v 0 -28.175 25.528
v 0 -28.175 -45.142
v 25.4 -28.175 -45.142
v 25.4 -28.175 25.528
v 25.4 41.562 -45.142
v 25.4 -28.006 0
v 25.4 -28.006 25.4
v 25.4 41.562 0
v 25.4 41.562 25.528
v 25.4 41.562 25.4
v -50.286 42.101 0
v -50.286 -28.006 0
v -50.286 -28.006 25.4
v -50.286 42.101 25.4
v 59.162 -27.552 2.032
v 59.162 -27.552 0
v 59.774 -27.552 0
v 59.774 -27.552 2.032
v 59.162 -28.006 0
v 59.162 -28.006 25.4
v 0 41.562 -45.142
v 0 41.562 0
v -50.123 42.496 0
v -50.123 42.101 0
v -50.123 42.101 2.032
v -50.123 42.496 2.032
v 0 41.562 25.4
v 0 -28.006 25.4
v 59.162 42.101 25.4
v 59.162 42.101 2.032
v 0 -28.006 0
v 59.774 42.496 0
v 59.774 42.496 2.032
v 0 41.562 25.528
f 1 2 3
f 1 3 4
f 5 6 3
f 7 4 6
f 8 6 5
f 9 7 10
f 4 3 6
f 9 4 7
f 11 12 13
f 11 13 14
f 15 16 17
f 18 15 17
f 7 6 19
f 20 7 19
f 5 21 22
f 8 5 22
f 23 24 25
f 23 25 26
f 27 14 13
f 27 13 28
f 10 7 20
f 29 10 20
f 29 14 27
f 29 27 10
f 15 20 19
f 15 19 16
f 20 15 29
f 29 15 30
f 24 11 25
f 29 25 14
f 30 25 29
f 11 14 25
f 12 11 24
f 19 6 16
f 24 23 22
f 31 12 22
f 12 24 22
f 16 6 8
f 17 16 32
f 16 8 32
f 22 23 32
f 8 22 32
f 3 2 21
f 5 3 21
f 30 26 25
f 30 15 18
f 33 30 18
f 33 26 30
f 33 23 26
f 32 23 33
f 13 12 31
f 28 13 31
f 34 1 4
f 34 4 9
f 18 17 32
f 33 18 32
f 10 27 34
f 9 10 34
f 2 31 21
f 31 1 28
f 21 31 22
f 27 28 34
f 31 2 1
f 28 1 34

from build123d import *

# Parameters (mm, degrees)
F0_W     = 109.44755
F0_H     = 70.106957
F1_DEPTH = 25.4
F2_W     = 69.736343
F2_H     = 70.670309
F3_DEPTH = 25.4
F4_W     = 109.896999
F4_H     = 70.047663
F5_DEPTH = 2.032


with BuildPart() as f1:
    # F0 (on Top) → F1 (new body)
    with BuildSketch(Plane.XY):
        with Locations((4.438201, 7.047662)):
            Rectangle(F0_W, F0_H)
    extrude(amount=F1_DEPTH)

    # F2 (on Right) → F3 (join)
    with BuildSketch(Plane.YZ):
        with Locations((6.693443, -9.806676)):
            Rectangle(F2_W, F2_H)
    extrude(amount=F3_DEPTH)

    # F4 (on Top) → F5 (join)
    with BuildSketch(Plane.XY):
        with Locations((4.825505, 7.471751)):
            Rectangle(F4_W, F4_H)
    extrude(amount=F5_DEPTH)


solid = f1.part
